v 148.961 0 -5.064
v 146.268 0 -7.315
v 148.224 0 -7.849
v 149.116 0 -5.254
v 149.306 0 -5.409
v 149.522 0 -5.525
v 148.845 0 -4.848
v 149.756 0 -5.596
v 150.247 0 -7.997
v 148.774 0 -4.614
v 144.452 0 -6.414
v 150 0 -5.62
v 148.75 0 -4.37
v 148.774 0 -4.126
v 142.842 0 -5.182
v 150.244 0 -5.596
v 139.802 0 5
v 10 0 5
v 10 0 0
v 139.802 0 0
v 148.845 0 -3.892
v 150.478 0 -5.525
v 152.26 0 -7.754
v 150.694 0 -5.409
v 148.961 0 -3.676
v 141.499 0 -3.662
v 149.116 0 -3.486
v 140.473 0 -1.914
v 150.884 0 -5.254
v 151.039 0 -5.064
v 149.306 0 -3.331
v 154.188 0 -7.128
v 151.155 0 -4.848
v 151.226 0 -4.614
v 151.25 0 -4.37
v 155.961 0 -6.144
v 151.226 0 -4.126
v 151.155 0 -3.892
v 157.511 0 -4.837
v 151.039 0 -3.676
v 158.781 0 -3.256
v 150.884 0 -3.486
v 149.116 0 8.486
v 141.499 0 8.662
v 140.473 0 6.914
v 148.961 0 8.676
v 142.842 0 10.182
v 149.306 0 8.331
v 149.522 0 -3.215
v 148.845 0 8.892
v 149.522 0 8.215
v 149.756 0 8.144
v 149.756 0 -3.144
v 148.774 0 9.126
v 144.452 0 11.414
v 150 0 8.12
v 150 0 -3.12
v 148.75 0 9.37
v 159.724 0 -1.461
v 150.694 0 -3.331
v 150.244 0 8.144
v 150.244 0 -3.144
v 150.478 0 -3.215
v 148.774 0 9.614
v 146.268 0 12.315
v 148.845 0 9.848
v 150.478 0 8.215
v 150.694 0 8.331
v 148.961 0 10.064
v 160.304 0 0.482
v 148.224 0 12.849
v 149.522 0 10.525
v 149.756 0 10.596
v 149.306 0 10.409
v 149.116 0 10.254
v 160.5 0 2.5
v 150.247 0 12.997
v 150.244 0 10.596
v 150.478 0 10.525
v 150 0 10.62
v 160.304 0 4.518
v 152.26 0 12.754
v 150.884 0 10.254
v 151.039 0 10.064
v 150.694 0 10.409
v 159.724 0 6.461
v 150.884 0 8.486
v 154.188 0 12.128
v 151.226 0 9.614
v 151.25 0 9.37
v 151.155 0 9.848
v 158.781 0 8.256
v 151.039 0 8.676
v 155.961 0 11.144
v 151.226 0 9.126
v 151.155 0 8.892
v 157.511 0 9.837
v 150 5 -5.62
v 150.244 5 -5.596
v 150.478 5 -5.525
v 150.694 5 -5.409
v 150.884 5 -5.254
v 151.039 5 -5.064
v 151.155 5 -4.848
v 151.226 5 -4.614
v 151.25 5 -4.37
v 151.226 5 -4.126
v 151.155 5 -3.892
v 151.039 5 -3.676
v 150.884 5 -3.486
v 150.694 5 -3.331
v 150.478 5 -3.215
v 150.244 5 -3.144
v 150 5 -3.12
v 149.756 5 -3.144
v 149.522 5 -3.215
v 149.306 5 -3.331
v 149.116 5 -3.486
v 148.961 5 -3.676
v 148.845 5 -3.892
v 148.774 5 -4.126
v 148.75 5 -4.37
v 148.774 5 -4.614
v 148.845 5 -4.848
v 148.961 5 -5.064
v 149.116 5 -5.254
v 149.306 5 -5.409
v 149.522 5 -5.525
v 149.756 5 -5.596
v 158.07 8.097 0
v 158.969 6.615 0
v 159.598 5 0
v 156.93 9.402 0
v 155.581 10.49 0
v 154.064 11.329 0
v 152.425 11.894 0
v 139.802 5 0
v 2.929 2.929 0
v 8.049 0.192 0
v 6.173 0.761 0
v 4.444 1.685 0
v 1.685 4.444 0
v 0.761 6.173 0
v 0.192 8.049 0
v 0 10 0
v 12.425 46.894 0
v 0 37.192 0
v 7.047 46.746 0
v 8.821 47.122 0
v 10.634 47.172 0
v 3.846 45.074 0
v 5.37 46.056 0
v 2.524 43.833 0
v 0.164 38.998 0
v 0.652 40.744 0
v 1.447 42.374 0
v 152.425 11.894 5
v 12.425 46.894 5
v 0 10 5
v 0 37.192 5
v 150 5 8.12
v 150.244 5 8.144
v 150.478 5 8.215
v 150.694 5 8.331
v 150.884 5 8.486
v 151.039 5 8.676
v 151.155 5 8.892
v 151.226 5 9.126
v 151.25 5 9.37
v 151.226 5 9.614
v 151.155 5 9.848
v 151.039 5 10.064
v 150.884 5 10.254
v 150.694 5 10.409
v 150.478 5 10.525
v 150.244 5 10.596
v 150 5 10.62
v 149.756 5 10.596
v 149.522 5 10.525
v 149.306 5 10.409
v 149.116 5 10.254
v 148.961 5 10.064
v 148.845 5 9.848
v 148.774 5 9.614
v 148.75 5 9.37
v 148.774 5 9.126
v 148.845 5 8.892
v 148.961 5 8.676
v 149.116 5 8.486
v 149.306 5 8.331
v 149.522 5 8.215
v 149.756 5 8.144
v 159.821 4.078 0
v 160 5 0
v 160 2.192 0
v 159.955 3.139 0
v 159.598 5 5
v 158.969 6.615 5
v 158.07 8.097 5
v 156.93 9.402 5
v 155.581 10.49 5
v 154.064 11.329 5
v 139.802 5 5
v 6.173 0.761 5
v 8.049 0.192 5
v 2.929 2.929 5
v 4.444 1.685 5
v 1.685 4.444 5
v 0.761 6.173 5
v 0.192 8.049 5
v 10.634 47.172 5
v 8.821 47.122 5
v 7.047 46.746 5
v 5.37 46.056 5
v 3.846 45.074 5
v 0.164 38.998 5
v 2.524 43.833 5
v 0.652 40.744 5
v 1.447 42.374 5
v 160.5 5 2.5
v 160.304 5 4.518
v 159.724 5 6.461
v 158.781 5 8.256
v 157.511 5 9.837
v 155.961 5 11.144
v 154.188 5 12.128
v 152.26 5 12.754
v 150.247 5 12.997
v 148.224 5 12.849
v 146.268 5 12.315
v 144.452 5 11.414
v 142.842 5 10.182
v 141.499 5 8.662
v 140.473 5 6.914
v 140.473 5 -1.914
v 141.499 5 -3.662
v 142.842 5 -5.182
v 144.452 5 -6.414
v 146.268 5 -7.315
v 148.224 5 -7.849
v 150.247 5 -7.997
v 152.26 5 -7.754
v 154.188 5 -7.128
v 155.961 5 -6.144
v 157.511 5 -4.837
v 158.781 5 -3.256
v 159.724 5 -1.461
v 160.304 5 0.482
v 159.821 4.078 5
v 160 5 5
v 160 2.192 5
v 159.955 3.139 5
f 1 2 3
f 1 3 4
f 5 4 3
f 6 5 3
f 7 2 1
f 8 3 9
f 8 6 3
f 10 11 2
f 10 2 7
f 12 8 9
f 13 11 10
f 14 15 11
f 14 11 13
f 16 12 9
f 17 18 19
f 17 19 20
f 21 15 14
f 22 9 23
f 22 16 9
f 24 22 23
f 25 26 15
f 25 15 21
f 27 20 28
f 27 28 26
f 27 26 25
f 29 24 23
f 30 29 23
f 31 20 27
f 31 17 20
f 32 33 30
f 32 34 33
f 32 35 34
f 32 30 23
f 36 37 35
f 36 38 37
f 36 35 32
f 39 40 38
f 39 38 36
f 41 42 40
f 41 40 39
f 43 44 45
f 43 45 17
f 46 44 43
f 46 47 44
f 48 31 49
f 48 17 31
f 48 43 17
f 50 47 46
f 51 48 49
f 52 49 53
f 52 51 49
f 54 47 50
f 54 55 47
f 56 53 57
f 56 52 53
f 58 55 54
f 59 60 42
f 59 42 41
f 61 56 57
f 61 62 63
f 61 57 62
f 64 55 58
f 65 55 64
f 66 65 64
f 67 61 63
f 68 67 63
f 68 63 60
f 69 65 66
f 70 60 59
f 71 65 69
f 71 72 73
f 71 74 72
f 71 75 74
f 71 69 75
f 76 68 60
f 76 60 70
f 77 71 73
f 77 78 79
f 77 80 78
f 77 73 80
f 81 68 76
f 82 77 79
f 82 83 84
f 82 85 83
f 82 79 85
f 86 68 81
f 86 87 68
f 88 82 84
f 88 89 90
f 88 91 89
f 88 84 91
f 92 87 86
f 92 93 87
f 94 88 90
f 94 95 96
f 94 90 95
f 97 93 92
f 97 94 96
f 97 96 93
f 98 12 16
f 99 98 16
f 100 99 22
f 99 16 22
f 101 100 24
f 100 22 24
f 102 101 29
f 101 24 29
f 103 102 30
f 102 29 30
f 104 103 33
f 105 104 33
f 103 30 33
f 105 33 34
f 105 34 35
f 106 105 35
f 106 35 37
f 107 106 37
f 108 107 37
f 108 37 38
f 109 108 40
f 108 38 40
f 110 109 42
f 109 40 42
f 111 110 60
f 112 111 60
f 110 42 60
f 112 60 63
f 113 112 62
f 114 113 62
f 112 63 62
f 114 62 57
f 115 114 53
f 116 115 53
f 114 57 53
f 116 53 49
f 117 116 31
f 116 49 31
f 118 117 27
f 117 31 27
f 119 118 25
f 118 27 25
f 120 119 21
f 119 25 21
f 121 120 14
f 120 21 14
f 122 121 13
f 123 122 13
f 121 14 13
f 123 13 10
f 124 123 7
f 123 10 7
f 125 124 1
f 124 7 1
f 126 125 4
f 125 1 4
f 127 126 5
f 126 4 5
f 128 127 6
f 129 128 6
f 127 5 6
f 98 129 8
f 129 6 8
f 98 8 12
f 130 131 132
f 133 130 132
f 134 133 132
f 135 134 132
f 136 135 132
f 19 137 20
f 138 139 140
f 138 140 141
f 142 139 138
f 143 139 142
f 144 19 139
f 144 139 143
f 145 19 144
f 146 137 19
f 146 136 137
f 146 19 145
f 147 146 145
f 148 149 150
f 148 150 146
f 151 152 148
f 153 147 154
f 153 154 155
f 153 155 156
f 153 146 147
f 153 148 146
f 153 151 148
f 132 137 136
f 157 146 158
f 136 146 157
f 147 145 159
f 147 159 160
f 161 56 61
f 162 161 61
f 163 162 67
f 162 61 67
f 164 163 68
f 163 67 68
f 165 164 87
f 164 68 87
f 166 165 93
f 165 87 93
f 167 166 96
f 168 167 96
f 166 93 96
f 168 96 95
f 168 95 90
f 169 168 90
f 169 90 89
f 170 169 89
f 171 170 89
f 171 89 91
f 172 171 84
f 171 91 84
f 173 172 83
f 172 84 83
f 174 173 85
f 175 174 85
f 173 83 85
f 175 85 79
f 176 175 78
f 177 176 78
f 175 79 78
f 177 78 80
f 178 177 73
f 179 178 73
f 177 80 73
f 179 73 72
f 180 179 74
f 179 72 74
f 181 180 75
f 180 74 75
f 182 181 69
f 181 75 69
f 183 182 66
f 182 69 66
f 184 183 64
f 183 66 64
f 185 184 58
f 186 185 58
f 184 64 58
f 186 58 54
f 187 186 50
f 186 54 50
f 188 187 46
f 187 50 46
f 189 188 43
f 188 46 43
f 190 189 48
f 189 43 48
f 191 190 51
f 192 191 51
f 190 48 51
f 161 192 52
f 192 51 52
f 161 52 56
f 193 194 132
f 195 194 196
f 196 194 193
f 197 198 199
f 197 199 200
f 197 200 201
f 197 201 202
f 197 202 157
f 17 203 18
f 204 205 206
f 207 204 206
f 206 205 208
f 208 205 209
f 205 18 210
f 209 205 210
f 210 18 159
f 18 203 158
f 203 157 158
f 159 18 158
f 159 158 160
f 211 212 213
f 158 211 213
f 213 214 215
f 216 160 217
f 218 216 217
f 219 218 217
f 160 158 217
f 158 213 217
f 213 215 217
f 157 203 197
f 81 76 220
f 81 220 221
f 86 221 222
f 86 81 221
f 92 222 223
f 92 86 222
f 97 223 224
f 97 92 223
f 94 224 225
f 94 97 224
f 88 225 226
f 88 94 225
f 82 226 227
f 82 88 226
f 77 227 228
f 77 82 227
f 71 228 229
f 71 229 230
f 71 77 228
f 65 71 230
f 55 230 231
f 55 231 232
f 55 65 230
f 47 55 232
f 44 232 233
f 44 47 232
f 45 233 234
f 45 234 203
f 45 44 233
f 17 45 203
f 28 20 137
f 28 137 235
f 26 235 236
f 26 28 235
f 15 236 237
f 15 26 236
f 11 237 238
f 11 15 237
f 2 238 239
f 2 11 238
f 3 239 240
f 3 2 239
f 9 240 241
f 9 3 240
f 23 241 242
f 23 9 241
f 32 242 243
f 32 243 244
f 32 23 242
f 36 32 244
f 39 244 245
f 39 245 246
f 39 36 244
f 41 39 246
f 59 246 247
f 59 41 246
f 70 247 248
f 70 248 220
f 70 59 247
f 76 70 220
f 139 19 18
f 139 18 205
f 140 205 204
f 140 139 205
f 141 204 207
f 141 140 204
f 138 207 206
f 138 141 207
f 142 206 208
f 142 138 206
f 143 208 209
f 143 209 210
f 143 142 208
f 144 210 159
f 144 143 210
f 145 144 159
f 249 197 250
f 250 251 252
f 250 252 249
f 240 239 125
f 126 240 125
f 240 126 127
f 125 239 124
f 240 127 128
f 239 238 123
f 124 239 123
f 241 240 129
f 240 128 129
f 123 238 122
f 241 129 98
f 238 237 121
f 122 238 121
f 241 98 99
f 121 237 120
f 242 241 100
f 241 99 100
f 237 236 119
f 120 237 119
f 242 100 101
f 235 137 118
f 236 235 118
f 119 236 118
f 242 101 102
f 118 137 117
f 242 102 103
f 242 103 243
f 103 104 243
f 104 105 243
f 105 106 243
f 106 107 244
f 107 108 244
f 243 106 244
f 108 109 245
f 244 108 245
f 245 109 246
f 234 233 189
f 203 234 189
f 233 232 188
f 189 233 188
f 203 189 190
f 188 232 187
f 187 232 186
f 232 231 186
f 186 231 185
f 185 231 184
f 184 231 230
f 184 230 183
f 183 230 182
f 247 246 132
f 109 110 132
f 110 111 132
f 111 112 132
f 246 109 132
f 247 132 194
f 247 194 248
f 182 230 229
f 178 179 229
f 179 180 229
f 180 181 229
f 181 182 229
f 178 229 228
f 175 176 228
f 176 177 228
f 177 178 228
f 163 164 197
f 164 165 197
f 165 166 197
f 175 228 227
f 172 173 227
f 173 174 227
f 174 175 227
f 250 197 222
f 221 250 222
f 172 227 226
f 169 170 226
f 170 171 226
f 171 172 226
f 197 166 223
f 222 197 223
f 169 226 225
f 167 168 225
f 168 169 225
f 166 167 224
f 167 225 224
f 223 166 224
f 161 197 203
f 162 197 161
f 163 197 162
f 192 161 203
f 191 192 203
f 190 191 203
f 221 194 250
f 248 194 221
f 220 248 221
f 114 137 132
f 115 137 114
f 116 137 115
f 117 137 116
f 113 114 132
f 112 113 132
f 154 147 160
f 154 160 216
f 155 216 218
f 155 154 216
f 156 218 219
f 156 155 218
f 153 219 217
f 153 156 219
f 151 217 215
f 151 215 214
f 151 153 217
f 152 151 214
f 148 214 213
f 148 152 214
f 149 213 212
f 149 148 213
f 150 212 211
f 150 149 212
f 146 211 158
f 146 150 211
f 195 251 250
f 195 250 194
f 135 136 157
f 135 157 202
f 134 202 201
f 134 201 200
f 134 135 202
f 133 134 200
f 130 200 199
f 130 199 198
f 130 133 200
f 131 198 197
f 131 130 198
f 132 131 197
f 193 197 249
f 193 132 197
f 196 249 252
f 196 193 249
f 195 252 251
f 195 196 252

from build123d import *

# Parameters (mm, degrees)
EXTRUDE_1_DEPTH = 5
SKETCH_2_R      = 1.25
EXTRUDE_4_DEPTH = 5


with BuildPart() as part:
    # 스케치1 → 보스-돌출1 (new body)
    with BuildSketch(Plane.XY):
        with BuildLine():
            Line((0, 10), (0, 37.192235936))
            ThreePointArc((0, 37.192235936), (3.845877906, 45.074290316), (12.42535625, 46.893660937))
            Line((12.42535625, 46.893660937), (152.42535625, 11.893660937))
            ThreePointArc((152.42535625, 11.893660937), (157.88205438, 8.34635803), (160, 2.192235936))
            Line((160, 2.192235936), (160, 0))
            Line((160, 0), (10, 0))
            ThreePointArc((10, 0), (2.928932188, 2.928932188), (0, 10))
        make_face()
    extrude(amount=EXTRUDE_1_DEPTH)

    # 스케치2 → 보스-돌출4 (add)
    with BuildSketch(Plane.XZ):
        with BuildLine():
            Line((150, 0), (139.801960973, 0))
            ThreePointArc((139.801960973, 0), (151.259085028, -7.924236418), (160.5, 2.5))
            ThreePointArc((160.5, 2.5), (151.259085028, 12.924236418), (139.801960973, 5))
            Line((139.801960973, 5), (150, 5))
            Line((150, 5), (160, 5))
            Line((160, 5), (160, 0))
            Line((160, 0), (150, 0))
        make_face()
        with Locations(Location((150, -4.37, 0), (0, 0, 270))):
            Circle(SKETCH_2_R, mode=Mode.SUBTRACT)
        with Locations(Location((150, 9.37, 0), (0, 0, 270))):
            Circle(SKETCH_2_R, mode=Mode.SUBTRACT)
    extrude(amount=-EXTRUDE_4_DEPTH)


solid = part.part
